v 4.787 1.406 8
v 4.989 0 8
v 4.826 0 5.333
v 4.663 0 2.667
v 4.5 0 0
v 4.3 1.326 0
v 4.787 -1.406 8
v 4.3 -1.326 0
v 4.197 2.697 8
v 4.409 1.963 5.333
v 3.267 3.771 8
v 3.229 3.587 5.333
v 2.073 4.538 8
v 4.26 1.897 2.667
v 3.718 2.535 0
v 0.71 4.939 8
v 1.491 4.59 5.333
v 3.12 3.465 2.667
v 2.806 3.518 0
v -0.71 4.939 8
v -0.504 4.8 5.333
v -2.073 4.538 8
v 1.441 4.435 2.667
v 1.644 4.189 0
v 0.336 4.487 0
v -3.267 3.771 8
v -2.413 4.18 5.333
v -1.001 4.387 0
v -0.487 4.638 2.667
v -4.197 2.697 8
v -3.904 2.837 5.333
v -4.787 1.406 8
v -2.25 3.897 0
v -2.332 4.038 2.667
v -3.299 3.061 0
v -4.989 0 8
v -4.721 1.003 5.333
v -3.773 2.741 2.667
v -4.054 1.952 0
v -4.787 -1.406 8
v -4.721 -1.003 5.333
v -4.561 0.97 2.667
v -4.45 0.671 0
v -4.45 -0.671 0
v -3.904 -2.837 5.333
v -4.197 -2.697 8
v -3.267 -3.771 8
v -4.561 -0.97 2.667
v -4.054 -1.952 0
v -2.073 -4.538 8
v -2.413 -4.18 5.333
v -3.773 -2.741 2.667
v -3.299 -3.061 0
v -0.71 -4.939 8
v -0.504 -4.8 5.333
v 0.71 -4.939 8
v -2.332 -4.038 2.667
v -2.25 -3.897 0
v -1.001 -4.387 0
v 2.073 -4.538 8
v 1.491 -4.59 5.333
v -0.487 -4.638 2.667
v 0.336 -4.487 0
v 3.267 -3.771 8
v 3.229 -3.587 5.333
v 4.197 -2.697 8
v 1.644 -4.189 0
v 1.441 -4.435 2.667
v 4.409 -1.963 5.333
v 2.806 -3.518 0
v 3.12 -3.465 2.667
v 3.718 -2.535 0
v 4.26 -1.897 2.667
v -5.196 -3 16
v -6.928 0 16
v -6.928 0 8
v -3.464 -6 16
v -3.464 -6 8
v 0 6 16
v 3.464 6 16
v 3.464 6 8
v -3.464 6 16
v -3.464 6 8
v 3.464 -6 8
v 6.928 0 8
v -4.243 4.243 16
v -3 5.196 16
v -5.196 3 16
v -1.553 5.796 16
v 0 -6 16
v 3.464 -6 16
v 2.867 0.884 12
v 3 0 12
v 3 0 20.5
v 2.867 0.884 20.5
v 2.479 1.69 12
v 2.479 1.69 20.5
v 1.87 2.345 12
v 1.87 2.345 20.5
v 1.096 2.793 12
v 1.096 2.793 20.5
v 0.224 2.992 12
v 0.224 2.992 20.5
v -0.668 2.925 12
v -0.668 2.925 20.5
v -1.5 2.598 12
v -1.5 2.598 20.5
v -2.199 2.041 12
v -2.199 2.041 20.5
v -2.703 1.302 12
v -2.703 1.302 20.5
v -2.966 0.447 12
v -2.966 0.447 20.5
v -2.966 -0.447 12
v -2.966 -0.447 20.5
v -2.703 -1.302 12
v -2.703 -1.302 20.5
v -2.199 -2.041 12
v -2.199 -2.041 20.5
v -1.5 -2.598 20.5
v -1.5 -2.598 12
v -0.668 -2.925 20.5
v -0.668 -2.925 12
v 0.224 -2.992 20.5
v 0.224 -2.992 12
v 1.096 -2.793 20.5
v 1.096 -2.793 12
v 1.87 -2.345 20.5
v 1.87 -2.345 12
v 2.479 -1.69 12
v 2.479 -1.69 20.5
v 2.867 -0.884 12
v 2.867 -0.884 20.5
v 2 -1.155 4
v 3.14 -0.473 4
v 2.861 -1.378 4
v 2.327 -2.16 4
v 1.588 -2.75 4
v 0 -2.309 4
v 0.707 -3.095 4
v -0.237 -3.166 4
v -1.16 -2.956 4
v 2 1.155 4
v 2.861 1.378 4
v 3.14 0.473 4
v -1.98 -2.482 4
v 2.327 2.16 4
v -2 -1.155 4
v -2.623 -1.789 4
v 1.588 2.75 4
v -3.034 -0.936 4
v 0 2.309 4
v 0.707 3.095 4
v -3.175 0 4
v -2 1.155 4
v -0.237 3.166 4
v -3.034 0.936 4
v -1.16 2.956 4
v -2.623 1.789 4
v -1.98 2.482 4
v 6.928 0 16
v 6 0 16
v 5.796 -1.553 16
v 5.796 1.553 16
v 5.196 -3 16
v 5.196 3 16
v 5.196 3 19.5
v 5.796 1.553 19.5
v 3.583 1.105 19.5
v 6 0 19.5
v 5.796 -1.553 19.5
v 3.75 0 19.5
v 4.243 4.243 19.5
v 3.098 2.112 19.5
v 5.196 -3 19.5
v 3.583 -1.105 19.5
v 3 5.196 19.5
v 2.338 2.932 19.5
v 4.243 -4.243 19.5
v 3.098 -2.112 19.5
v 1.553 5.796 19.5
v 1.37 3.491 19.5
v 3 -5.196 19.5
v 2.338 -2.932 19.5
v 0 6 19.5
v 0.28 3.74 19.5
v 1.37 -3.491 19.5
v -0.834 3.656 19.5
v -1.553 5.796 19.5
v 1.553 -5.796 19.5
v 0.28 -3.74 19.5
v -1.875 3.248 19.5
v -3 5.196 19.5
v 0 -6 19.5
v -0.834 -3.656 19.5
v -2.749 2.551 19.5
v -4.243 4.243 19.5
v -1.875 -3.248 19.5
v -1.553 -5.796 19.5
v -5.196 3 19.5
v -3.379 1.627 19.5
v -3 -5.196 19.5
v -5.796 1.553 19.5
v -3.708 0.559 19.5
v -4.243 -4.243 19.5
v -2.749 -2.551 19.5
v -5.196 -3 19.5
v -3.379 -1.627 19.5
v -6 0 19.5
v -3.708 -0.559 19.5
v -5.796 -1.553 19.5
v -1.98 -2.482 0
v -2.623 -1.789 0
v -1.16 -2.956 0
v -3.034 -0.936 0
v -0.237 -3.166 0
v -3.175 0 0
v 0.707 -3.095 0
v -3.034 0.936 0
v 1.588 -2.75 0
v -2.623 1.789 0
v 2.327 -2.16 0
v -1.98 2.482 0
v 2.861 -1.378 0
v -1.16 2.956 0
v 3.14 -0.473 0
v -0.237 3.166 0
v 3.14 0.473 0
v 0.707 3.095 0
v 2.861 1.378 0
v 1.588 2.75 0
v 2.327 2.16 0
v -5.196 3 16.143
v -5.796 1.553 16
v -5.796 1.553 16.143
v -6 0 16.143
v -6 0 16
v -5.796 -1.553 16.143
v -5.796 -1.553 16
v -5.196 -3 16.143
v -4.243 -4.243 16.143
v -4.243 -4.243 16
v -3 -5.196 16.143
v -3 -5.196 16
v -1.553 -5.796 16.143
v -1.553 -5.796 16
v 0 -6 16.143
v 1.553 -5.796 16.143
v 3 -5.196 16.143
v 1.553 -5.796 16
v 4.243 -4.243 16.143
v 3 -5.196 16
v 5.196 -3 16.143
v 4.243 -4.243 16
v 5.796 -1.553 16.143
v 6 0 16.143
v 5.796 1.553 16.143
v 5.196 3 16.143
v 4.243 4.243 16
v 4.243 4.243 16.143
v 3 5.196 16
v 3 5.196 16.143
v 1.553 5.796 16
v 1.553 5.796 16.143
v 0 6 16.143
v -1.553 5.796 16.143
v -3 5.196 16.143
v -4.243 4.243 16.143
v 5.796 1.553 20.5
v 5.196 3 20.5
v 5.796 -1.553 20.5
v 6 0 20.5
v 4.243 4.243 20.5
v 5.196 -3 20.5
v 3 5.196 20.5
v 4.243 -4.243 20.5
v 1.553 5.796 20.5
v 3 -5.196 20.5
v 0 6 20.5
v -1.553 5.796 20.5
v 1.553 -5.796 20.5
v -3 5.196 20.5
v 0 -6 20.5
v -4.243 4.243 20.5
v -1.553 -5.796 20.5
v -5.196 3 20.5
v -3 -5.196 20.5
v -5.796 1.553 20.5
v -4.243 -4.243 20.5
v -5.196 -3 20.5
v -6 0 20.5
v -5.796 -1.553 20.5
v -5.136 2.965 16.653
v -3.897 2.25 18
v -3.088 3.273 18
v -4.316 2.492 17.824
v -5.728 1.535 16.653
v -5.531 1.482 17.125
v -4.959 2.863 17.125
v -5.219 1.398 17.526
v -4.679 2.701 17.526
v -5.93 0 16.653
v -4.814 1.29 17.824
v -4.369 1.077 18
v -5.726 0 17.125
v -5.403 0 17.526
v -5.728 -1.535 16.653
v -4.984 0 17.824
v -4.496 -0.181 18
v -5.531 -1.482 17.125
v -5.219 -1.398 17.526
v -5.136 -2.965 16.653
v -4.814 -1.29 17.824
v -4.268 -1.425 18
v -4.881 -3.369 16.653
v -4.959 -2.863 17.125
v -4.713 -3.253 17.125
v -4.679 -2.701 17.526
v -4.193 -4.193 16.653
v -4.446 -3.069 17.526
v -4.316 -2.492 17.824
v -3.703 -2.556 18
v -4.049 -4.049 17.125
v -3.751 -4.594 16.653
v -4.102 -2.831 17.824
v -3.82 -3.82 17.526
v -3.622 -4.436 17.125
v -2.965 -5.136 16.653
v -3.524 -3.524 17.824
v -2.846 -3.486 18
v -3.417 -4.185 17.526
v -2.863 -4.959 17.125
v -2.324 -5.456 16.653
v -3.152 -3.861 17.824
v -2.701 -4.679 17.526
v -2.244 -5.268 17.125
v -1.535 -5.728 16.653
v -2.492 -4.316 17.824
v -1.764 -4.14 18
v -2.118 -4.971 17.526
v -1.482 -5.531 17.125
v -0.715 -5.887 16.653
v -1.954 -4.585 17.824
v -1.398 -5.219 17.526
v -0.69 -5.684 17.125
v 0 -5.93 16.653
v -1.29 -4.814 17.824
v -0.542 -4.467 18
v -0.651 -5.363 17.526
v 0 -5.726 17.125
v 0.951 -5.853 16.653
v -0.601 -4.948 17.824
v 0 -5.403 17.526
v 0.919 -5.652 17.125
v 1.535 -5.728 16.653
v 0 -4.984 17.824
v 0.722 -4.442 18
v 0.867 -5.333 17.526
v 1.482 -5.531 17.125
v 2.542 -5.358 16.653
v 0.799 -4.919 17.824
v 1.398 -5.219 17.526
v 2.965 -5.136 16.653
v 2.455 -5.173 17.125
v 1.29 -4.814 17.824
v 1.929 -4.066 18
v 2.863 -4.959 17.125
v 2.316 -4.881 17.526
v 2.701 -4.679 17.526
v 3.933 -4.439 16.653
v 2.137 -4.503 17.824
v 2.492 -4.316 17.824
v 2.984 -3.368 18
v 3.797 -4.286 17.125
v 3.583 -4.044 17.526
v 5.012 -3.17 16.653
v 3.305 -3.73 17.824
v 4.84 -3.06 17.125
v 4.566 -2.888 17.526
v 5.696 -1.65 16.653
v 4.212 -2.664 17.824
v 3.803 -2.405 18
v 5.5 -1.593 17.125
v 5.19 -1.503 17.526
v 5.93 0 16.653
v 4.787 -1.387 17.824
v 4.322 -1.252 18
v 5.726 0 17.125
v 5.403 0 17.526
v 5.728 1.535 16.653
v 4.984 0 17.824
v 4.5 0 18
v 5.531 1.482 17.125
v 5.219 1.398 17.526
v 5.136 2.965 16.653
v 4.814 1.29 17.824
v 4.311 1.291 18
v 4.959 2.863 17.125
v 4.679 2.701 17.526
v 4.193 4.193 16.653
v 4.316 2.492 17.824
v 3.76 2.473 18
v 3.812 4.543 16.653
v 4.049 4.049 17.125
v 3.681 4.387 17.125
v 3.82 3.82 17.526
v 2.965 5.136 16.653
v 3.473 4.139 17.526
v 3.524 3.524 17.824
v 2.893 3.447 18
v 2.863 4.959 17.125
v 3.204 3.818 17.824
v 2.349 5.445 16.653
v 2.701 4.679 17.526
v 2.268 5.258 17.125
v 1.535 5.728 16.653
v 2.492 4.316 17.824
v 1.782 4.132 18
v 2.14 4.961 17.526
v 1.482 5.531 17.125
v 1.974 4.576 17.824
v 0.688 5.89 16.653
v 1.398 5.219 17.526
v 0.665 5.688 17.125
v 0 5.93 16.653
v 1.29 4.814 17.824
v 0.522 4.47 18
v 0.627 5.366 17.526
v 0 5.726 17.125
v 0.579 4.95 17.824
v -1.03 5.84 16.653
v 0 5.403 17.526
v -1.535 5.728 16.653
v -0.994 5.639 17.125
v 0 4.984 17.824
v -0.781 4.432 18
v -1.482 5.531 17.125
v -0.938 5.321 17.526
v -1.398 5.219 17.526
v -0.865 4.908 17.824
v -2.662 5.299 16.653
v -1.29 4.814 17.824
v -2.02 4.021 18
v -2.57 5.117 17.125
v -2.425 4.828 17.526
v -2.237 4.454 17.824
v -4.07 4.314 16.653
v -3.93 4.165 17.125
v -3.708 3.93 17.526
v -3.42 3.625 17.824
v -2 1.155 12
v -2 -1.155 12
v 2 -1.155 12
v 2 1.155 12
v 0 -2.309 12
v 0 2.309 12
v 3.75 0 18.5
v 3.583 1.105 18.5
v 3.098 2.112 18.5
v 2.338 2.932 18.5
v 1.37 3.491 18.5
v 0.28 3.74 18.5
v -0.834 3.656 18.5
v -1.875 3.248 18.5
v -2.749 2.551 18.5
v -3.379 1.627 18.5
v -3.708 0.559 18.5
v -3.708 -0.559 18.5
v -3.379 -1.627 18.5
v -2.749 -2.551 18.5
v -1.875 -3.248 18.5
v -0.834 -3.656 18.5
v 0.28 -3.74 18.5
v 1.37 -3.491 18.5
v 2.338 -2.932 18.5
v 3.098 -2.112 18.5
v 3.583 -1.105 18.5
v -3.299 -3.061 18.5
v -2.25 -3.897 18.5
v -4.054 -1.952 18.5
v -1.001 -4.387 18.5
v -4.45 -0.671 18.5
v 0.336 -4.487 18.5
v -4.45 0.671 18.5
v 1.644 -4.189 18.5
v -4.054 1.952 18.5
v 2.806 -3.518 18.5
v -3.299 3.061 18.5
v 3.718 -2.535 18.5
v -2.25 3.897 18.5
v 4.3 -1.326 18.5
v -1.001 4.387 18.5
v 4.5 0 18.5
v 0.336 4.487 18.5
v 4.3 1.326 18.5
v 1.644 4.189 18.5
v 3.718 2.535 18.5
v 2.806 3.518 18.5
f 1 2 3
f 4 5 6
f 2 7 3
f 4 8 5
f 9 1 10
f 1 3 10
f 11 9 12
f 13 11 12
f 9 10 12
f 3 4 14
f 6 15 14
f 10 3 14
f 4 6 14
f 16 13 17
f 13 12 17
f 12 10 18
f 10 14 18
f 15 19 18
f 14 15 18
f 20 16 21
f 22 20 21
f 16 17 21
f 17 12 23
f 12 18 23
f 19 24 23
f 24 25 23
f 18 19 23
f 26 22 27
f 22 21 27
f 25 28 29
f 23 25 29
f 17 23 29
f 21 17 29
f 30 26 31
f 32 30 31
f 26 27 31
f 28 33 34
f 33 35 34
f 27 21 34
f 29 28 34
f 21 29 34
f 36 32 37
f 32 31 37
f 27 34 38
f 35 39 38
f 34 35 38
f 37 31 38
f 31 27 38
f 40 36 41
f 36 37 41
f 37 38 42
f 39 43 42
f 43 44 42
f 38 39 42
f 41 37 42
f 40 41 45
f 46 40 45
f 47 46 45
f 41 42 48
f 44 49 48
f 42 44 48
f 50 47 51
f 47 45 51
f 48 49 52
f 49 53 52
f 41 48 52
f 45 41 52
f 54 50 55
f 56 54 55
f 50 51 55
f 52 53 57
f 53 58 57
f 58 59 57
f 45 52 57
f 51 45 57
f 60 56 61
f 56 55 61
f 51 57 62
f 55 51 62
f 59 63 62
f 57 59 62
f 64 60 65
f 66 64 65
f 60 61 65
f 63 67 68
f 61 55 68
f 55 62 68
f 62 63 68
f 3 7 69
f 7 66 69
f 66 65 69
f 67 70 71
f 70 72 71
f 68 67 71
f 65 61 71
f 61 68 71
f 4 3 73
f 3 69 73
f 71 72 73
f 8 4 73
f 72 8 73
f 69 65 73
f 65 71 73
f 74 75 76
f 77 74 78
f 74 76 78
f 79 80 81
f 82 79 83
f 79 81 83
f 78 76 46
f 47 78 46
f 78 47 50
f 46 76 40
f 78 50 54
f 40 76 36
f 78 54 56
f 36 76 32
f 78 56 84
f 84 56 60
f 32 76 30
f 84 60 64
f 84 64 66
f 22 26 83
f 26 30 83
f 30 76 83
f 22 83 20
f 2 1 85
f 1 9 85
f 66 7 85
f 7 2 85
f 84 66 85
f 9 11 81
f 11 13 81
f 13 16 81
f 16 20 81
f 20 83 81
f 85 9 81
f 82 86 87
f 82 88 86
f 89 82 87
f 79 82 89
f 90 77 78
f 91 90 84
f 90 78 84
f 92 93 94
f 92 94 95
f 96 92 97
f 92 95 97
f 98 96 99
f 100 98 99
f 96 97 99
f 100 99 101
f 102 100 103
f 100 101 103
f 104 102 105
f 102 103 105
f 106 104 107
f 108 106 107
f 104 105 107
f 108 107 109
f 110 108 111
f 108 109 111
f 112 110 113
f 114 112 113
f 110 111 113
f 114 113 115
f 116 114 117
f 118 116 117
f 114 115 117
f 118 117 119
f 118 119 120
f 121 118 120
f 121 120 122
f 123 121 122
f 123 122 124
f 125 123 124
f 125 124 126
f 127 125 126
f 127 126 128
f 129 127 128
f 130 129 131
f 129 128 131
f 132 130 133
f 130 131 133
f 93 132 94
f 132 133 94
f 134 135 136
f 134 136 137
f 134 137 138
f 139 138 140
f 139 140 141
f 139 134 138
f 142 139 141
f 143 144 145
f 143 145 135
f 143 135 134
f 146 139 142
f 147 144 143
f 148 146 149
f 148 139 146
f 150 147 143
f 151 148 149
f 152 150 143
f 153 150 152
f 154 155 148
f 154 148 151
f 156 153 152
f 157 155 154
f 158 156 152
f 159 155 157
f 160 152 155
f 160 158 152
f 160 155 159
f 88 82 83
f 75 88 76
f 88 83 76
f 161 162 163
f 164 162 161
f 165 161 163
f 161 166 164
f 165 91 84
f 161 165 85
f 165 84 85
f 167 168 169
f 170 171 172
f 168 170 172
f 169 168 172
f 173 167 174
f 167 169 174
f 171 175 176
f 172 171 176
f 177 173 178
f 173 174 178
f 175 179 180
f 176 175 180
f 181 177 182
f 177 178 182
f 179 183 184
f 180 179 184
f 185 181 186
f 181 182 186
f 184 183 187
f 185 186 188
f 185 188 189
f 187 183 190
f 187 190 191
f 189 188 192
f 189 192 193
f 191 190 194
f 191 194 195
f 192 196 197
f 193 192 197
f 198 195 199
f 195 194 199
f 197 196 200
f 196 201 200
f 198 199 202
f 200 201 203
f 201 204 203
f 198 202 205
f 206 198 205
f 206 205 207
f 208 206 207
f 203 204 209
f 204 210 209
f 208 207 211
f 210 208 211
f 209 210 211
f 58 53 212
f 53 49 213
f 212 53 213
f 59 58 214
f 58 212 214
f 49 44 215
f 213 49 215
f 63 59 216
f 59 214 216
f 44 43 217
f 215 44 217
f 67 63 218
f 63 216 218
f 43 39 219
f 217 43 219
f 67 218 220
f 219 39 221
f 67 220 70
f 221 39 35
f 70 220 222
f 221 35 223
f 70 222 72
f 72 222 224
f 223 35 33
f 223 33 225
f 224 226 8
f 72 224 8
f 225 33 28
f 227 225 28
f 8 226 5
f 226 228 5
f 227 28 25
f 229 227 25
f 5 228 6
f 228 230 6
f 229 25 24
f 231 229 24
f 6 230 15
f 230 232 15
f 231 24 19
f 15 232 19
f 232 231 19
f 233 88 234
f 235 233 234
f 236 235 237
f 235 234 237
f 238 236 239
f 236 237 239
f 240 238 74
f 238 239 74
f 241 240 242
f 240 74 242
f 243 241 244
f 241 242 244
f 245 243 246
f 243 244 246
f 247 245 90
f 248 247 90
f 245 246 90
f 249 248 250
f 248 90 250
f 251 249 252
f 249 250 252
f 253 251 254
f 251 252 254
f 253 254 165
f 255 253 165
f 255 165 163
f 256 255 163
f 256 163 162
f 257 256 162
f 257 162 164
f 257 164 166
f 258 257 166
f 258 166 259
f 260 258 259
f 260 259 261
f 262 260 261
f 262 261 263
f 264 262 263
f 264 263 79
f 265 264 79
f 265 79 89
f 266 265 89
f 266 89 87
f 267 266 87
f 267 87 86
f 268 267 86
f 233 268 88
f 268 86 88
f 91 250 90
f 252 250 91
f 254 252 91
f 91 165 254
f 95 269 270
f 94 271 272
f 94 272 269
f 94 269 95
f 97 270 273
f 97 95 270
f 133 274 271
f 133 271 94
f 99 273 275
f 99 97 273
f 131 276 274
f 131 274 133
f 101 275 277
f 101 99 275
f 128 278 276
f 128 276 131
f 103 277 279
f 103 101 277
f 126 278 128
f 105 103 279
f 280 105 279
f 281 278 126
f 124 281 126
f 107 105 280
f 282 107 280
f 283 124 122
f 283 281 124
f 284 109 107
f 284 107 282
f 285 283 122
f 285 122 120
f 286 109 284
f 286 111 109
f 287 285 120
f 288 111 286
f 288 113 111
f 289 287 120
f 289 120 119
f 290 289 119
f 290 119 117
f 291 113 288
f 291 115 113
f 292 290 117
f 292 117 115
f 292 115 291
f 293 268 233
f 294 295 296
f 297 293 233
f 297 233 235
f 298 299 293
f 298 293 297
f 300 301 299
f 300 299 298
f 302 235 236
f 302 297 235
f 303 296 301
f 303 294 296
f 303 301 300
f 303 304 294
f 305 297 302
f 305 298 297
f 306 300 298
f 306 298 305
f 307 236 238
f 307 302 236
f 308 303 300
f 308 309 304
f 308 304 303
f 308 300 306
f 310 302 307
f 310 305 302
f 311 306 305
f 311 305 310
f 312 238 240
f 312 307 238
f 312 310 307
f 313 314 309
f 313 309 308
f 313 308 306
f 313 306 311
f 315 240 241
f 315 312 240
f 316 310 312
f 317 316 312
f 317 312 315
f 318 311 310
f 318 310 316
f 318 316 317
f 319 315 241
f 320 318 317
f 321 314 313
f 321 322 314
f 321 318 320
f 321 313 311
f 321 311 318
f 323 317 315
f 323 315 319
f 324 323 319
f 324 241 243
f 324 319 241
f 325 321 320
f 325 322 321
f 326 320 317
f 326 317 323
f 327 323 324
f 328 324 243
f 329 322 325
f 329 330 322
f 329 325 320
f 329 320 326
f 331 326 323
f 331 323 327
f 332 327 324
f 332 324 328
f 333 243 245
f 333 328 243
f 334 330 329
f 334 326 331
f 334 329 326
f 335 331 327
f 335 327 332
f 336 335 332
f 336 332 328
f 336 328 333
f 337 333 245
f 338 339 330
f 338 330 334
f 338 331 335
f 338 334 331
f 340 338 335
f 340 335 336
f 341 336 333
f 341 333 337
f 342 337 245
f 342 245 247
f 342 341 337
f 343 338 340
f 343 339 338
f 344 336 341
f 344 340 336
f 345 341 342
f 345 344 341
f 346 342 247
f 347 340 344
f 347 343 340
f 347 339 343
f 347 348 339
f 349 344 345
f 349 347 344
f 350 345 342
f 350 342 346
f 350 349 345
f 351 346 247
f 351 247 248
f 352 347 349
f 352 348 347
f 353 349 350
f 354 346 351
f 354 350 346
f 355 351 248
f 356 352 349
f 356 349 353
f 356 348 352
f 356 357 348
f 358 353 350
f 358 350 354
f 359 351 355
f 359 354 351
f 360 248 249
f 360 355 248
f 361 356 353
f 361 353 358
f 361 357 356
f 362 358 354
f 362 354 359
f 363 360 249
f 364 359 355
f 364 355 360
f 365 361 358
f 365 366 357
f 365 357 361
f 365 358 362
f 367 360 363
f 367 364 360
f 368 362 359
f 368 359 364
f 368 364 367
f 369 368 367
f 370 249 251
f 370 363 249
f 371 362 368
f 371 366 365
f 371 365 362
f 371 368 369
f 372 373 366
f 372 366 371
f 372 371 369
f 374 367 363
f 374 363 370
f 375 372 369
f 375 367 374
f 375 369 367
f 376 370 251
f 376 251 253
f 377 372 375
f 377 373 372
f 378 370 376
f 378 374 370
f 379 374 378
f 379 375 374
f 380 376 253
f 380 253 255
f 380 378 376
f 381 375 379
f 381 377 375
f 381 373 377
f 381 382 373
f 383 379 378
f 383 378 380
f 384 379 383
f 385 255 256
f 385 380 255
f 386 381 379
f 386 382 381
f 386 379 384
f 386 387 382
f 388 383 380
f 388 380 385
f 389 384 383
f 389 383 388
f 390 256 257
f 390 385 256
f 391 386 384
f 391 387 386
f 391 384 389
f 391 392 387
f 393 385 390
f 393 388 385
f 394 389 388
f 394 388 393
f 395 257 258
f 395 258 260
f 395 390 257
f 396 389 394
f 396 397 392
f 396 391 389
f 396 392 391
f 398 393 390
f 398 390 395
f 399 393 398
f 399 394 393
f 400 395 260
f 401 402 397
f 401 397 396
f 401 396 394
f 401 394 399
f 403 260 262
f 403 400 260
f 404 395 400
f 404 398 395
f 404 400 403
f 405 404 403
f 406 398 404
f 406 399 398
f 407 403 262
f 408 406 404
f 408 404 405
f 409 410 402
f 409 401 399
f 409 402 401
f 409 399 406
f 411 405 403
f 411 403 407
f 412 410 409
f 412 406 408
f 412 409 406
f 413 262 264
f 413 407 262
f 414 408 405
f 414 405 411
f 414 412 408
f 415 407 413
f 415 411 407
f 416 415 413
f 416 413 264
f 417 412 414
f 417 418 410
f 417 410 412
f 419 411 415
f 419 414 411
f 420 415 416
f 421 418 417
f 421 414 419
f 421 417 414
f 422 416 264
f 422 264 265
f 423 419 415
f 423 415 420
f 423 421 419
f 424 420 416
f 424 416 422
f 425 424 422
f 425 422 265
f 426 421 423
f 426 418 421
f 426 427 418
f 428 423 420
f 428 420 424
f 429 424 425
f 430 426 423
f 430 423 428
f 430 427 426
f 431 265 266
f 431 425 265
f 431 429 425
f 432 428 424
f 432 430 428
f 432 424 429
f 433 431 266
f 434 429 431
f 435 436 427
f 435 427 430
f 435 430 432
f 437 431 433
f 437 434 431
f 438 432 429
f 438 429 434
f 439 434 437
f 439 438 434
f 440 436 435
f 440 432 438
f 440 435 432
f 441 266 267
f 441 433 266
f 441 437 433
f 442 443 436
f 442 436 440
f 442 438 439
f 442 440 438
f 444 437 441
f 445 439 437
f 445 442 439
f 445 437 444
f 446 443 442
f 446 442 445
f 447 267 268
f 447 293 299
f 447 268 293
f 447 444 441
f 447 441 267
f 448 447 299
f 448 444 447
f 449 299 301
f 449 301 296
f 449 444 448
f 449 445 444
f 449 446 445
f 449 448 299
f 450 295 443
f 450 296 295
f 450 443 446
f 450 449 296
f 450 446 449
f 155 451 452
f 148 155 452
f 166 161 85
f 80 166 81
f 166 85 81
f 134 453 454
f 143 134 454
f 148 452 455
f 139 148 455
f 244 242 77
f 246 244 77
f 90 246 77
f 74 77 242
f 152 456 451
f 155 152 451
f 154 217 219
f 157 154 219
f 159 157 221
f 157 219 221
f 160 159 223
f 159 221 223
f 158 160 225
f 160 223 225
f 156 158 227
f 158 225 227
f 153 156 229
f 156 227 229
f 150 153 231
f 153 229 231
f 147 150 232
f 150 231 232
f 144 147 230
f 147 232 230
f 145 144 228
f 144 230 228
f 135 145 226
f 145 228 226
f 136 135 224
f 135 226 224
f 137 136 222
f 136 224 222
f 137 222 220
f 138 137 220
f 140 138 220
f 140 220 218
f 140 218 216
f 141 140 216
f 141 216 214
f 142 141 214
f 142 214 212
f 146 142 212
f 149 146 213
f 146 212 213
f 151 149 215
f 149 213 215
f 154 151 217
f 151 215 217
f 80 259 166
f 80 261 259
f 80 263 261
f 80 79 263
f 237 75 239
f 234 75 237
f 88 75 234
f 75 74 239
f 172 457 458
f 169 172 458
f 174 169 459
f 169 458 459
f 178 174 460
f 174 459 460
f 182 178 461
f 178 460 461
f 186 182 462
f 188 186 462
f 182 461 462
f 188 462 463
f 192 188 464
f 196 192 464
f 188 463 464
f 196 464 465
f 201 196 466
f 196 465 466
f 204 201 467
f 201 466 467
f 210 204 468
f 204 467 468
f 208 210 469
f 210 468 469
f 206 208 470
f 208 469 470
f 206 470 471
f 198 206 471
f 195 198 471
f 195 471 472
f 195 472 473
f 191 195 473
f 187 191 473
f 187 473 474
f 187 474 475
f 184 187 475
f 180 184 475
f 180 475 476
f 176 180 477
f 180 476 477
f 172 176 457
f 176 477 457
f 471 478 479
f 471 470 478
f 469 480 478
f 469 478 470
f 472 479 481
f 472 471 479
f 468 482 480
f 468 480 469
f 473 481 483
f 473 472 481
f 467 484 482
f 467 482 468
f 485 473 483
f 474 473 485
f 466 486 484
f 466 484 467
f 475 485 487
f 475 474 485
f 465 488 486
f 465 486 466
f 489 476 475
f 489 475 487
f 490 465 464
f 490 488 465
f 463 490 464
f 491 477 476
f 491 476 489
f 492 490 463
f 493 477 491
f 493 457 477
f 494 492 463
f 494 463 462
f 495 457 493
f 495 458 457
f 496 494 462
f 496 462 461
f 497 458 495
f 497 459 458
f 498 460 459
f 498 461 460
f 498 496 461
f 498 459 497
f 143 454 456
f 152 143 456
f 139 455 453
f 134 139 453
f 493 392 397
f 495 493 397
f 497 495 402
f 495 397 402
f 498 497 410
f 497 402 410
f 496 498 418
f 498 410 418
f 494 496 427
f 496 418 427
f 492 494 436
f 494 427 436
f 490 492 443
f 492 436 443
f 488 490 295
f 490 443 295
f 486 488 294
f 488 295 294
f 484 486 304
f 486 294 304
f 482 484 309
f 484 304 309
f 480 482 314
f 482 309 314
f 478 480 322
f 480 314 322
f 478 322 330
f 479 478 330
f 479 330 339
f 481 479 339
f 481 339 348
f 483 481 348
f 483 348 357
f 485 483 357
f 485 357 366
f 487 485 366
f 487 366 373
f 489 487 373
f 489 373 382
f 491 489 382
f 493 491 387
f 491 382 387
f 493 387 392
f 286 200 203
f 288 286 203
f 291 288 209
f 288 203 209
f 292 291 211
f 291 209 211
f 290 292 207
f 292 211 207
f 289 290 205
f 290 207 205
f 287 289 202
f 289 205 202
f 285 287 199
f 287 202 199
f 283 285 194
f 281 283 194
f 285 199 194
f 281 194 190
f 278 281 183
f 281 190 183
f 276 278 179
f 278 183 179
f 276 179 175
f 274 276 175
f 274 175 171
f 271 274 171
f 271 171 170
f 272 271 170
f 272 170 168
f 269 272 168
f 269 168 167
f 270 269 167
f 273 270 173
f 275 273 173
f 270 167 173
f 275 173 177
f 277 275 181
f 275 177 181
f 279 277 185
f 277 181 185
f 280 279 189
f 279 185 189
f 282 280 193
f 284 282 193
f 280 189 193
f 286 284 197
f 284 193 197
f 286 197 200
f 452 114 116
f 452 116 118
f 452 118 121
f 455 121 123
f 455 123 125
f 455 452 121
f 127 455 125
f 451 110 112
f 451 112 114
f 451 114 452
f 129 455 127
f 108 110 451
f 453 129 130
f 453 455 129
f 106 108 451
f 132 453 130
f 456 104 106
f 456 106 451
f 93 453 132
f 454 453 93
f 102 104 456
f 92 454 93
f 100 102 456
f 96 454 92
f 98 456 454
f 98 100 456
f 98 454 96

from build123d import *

# Parameters (mm, degrees)
SKETCH1_R           = 4.5
BOSS_EXTRUDE1_DEPTH = 8
BOSS_EXTRUDE1_DRAFT = -3.5
BOSS_EXTRUDE2_DEPTH = 8
SKETCH3_R           = 6
BOSS_EXTRUDE3_DEPTH = 2
SKETCH9_R           = 4.5
BOSS_EXTRUDE6_DEPTH = 0.5
FILLET1_R           = 1.9
SKETCH4_R           = 3.75
BOSS_EXTRUDE4_DEPTH = 1
SKETCH5_R           = 6
BOSS_EXTRUDE5_DEPTH = 1
SKETCH6_R           = 3
CUT_EXTRUDE1_DEPTH  = 8.5
CUT_EXTRUDE2_DEPTH  = 8
SKETCH8_R           = 3.175
CUT_EXTRUDE3_DEPTH  = 4


with BuildPart() as part:
    # Sketch1 → Boss-Extrude1 (with draft: the straight prism first)
    with BuildSketch(Plane.XY):
        Circle(SKETCH1_R)
    extrude(amount=BOSS_EXTRUDE1_DEPTH)
    # Boss-Extrude1: the draft: its side faces are tilted about the plane it starts from
    boss_extrude1_sides = [part.faces().sort_by_distance(p)[0] for p in [
        (-4.5, 0, 4),
    ]]
    draft(boss_extrude1_sides, Plane.XY, BOSS_EXTRUDE1_DRAFT)

    # Sketch2 → Boss-Extrude2 (add)
    with BuildSketch(Plane.XY.offset(8)):
        Polygon((6.92820323, 0), (3.464101615, 6), (-3.464101615, 6), (-6.92820323, 0), (-3.464101615, -6), (3.464101615, -6), align=None)
    extrude(amount=BOSS_EXTRUDE2_DEPTH)

    # Sketch3 → Boss-Extrude3 (add)
    with BuildSketch(Plane.XY.offset(16)):
        with Locations(Location((0, 0, 0), (0, 0, 150))):
            Circle(SKETCH3_R)
    extrude(amount=BOSS_EXTRUDE3_DEPTH)

    # Sketch9 → Boss-Extrude6 (add)
    with BuildSketch(Plane.XY.offset(18)):
        Circle(SKETCH9_R)
    extrude(amount=BOSS_EXTRUDE6_DEPTH)

    # Fillet1
    # the kernel refuses this fillet: 1.9 mm, written as the material it takes off along each edge
    with BuildSketch(Plane(origin=(0, 0, 18), x_dir=(-0.8660254037844387, 0.49999999999999994, 0), z_dir=(0.49999999999999994, 0.8660254037844387, 0))) as fillet1_piece_1:
        with BuildLine():
            CenterArc((4.1, -1.857417562), FILLET1_R, 0, 77.846802531)
            Line((4.5, 0), (4.508, 0.037148351))
            ThreePointArc((4.508, 0.037148351), (5.25, 0.038), (6, 0.038))
            Line((6, 0.038), (6.038, 0))
            Line((6.038, 0), (6.038, -1.857417562))
            Line((6.038, -1.857417562), (6, -1.857417562))
        make_face()
    revolve(axis=Axis((0, 0, 18), (0, 0, 1)), mode=Mode.SUBTRACT)

    # Sketch4 → Boss-Extrude4 (add)
    with BuildSketch(Plane.XY.offset(18.5)):
        Circle(SKETCH4_R)
    extrude(amount=BOSS_EXTRUDE4_DEPTH)

    # Sketch5 → Boss-Extrude5 (add)
    with BuildSketch(Plane.XY.offset(19.5)):
        with Locations(Location((0, 0, 0), (0, 0, 150))):
            Circle(SKETCH5_R)
    extrude(amount=BOSS_EXTRUDE5_DEPTH)

    # Sketch6 → Cut-Extrude1 (cut)
    with BuildSketch(Plane.XY.offset(20.5)):
        Circle(SKETCH6_R)
    extrude(amount=-CUT_EXTRUDE1_DEPTH, mode=Mode.SUBTRACT)

    # Sketch7 → Cut-Extrude2 (cut)
    with BuildSketch(Plane.XY.offset(12)):
        Polygon((0, -2.309401077), (2, -1.154700538), (2, 1.154700538), (0, 2.309401077), (-2, 1.154700538), (-2, -1.154700538), align=None)
    extrude(amount=-CUT_EXTRUDE2_DEPTH, mode=Mode.SUBTRACT)

    # Sketch8 → Cut-Extrude3 (cut)
    with BuildSketch(Plane(origin=(0, 0, 0), x_dir=(-1, 0, 0), z_dir=(0, 0, -1))):
        Circle(SKETCH8_R)
    extrude(amount=-CUT_EXTRUDE3_DEPTH, mode=Mode.SUBTRACT)


solid = part.part
